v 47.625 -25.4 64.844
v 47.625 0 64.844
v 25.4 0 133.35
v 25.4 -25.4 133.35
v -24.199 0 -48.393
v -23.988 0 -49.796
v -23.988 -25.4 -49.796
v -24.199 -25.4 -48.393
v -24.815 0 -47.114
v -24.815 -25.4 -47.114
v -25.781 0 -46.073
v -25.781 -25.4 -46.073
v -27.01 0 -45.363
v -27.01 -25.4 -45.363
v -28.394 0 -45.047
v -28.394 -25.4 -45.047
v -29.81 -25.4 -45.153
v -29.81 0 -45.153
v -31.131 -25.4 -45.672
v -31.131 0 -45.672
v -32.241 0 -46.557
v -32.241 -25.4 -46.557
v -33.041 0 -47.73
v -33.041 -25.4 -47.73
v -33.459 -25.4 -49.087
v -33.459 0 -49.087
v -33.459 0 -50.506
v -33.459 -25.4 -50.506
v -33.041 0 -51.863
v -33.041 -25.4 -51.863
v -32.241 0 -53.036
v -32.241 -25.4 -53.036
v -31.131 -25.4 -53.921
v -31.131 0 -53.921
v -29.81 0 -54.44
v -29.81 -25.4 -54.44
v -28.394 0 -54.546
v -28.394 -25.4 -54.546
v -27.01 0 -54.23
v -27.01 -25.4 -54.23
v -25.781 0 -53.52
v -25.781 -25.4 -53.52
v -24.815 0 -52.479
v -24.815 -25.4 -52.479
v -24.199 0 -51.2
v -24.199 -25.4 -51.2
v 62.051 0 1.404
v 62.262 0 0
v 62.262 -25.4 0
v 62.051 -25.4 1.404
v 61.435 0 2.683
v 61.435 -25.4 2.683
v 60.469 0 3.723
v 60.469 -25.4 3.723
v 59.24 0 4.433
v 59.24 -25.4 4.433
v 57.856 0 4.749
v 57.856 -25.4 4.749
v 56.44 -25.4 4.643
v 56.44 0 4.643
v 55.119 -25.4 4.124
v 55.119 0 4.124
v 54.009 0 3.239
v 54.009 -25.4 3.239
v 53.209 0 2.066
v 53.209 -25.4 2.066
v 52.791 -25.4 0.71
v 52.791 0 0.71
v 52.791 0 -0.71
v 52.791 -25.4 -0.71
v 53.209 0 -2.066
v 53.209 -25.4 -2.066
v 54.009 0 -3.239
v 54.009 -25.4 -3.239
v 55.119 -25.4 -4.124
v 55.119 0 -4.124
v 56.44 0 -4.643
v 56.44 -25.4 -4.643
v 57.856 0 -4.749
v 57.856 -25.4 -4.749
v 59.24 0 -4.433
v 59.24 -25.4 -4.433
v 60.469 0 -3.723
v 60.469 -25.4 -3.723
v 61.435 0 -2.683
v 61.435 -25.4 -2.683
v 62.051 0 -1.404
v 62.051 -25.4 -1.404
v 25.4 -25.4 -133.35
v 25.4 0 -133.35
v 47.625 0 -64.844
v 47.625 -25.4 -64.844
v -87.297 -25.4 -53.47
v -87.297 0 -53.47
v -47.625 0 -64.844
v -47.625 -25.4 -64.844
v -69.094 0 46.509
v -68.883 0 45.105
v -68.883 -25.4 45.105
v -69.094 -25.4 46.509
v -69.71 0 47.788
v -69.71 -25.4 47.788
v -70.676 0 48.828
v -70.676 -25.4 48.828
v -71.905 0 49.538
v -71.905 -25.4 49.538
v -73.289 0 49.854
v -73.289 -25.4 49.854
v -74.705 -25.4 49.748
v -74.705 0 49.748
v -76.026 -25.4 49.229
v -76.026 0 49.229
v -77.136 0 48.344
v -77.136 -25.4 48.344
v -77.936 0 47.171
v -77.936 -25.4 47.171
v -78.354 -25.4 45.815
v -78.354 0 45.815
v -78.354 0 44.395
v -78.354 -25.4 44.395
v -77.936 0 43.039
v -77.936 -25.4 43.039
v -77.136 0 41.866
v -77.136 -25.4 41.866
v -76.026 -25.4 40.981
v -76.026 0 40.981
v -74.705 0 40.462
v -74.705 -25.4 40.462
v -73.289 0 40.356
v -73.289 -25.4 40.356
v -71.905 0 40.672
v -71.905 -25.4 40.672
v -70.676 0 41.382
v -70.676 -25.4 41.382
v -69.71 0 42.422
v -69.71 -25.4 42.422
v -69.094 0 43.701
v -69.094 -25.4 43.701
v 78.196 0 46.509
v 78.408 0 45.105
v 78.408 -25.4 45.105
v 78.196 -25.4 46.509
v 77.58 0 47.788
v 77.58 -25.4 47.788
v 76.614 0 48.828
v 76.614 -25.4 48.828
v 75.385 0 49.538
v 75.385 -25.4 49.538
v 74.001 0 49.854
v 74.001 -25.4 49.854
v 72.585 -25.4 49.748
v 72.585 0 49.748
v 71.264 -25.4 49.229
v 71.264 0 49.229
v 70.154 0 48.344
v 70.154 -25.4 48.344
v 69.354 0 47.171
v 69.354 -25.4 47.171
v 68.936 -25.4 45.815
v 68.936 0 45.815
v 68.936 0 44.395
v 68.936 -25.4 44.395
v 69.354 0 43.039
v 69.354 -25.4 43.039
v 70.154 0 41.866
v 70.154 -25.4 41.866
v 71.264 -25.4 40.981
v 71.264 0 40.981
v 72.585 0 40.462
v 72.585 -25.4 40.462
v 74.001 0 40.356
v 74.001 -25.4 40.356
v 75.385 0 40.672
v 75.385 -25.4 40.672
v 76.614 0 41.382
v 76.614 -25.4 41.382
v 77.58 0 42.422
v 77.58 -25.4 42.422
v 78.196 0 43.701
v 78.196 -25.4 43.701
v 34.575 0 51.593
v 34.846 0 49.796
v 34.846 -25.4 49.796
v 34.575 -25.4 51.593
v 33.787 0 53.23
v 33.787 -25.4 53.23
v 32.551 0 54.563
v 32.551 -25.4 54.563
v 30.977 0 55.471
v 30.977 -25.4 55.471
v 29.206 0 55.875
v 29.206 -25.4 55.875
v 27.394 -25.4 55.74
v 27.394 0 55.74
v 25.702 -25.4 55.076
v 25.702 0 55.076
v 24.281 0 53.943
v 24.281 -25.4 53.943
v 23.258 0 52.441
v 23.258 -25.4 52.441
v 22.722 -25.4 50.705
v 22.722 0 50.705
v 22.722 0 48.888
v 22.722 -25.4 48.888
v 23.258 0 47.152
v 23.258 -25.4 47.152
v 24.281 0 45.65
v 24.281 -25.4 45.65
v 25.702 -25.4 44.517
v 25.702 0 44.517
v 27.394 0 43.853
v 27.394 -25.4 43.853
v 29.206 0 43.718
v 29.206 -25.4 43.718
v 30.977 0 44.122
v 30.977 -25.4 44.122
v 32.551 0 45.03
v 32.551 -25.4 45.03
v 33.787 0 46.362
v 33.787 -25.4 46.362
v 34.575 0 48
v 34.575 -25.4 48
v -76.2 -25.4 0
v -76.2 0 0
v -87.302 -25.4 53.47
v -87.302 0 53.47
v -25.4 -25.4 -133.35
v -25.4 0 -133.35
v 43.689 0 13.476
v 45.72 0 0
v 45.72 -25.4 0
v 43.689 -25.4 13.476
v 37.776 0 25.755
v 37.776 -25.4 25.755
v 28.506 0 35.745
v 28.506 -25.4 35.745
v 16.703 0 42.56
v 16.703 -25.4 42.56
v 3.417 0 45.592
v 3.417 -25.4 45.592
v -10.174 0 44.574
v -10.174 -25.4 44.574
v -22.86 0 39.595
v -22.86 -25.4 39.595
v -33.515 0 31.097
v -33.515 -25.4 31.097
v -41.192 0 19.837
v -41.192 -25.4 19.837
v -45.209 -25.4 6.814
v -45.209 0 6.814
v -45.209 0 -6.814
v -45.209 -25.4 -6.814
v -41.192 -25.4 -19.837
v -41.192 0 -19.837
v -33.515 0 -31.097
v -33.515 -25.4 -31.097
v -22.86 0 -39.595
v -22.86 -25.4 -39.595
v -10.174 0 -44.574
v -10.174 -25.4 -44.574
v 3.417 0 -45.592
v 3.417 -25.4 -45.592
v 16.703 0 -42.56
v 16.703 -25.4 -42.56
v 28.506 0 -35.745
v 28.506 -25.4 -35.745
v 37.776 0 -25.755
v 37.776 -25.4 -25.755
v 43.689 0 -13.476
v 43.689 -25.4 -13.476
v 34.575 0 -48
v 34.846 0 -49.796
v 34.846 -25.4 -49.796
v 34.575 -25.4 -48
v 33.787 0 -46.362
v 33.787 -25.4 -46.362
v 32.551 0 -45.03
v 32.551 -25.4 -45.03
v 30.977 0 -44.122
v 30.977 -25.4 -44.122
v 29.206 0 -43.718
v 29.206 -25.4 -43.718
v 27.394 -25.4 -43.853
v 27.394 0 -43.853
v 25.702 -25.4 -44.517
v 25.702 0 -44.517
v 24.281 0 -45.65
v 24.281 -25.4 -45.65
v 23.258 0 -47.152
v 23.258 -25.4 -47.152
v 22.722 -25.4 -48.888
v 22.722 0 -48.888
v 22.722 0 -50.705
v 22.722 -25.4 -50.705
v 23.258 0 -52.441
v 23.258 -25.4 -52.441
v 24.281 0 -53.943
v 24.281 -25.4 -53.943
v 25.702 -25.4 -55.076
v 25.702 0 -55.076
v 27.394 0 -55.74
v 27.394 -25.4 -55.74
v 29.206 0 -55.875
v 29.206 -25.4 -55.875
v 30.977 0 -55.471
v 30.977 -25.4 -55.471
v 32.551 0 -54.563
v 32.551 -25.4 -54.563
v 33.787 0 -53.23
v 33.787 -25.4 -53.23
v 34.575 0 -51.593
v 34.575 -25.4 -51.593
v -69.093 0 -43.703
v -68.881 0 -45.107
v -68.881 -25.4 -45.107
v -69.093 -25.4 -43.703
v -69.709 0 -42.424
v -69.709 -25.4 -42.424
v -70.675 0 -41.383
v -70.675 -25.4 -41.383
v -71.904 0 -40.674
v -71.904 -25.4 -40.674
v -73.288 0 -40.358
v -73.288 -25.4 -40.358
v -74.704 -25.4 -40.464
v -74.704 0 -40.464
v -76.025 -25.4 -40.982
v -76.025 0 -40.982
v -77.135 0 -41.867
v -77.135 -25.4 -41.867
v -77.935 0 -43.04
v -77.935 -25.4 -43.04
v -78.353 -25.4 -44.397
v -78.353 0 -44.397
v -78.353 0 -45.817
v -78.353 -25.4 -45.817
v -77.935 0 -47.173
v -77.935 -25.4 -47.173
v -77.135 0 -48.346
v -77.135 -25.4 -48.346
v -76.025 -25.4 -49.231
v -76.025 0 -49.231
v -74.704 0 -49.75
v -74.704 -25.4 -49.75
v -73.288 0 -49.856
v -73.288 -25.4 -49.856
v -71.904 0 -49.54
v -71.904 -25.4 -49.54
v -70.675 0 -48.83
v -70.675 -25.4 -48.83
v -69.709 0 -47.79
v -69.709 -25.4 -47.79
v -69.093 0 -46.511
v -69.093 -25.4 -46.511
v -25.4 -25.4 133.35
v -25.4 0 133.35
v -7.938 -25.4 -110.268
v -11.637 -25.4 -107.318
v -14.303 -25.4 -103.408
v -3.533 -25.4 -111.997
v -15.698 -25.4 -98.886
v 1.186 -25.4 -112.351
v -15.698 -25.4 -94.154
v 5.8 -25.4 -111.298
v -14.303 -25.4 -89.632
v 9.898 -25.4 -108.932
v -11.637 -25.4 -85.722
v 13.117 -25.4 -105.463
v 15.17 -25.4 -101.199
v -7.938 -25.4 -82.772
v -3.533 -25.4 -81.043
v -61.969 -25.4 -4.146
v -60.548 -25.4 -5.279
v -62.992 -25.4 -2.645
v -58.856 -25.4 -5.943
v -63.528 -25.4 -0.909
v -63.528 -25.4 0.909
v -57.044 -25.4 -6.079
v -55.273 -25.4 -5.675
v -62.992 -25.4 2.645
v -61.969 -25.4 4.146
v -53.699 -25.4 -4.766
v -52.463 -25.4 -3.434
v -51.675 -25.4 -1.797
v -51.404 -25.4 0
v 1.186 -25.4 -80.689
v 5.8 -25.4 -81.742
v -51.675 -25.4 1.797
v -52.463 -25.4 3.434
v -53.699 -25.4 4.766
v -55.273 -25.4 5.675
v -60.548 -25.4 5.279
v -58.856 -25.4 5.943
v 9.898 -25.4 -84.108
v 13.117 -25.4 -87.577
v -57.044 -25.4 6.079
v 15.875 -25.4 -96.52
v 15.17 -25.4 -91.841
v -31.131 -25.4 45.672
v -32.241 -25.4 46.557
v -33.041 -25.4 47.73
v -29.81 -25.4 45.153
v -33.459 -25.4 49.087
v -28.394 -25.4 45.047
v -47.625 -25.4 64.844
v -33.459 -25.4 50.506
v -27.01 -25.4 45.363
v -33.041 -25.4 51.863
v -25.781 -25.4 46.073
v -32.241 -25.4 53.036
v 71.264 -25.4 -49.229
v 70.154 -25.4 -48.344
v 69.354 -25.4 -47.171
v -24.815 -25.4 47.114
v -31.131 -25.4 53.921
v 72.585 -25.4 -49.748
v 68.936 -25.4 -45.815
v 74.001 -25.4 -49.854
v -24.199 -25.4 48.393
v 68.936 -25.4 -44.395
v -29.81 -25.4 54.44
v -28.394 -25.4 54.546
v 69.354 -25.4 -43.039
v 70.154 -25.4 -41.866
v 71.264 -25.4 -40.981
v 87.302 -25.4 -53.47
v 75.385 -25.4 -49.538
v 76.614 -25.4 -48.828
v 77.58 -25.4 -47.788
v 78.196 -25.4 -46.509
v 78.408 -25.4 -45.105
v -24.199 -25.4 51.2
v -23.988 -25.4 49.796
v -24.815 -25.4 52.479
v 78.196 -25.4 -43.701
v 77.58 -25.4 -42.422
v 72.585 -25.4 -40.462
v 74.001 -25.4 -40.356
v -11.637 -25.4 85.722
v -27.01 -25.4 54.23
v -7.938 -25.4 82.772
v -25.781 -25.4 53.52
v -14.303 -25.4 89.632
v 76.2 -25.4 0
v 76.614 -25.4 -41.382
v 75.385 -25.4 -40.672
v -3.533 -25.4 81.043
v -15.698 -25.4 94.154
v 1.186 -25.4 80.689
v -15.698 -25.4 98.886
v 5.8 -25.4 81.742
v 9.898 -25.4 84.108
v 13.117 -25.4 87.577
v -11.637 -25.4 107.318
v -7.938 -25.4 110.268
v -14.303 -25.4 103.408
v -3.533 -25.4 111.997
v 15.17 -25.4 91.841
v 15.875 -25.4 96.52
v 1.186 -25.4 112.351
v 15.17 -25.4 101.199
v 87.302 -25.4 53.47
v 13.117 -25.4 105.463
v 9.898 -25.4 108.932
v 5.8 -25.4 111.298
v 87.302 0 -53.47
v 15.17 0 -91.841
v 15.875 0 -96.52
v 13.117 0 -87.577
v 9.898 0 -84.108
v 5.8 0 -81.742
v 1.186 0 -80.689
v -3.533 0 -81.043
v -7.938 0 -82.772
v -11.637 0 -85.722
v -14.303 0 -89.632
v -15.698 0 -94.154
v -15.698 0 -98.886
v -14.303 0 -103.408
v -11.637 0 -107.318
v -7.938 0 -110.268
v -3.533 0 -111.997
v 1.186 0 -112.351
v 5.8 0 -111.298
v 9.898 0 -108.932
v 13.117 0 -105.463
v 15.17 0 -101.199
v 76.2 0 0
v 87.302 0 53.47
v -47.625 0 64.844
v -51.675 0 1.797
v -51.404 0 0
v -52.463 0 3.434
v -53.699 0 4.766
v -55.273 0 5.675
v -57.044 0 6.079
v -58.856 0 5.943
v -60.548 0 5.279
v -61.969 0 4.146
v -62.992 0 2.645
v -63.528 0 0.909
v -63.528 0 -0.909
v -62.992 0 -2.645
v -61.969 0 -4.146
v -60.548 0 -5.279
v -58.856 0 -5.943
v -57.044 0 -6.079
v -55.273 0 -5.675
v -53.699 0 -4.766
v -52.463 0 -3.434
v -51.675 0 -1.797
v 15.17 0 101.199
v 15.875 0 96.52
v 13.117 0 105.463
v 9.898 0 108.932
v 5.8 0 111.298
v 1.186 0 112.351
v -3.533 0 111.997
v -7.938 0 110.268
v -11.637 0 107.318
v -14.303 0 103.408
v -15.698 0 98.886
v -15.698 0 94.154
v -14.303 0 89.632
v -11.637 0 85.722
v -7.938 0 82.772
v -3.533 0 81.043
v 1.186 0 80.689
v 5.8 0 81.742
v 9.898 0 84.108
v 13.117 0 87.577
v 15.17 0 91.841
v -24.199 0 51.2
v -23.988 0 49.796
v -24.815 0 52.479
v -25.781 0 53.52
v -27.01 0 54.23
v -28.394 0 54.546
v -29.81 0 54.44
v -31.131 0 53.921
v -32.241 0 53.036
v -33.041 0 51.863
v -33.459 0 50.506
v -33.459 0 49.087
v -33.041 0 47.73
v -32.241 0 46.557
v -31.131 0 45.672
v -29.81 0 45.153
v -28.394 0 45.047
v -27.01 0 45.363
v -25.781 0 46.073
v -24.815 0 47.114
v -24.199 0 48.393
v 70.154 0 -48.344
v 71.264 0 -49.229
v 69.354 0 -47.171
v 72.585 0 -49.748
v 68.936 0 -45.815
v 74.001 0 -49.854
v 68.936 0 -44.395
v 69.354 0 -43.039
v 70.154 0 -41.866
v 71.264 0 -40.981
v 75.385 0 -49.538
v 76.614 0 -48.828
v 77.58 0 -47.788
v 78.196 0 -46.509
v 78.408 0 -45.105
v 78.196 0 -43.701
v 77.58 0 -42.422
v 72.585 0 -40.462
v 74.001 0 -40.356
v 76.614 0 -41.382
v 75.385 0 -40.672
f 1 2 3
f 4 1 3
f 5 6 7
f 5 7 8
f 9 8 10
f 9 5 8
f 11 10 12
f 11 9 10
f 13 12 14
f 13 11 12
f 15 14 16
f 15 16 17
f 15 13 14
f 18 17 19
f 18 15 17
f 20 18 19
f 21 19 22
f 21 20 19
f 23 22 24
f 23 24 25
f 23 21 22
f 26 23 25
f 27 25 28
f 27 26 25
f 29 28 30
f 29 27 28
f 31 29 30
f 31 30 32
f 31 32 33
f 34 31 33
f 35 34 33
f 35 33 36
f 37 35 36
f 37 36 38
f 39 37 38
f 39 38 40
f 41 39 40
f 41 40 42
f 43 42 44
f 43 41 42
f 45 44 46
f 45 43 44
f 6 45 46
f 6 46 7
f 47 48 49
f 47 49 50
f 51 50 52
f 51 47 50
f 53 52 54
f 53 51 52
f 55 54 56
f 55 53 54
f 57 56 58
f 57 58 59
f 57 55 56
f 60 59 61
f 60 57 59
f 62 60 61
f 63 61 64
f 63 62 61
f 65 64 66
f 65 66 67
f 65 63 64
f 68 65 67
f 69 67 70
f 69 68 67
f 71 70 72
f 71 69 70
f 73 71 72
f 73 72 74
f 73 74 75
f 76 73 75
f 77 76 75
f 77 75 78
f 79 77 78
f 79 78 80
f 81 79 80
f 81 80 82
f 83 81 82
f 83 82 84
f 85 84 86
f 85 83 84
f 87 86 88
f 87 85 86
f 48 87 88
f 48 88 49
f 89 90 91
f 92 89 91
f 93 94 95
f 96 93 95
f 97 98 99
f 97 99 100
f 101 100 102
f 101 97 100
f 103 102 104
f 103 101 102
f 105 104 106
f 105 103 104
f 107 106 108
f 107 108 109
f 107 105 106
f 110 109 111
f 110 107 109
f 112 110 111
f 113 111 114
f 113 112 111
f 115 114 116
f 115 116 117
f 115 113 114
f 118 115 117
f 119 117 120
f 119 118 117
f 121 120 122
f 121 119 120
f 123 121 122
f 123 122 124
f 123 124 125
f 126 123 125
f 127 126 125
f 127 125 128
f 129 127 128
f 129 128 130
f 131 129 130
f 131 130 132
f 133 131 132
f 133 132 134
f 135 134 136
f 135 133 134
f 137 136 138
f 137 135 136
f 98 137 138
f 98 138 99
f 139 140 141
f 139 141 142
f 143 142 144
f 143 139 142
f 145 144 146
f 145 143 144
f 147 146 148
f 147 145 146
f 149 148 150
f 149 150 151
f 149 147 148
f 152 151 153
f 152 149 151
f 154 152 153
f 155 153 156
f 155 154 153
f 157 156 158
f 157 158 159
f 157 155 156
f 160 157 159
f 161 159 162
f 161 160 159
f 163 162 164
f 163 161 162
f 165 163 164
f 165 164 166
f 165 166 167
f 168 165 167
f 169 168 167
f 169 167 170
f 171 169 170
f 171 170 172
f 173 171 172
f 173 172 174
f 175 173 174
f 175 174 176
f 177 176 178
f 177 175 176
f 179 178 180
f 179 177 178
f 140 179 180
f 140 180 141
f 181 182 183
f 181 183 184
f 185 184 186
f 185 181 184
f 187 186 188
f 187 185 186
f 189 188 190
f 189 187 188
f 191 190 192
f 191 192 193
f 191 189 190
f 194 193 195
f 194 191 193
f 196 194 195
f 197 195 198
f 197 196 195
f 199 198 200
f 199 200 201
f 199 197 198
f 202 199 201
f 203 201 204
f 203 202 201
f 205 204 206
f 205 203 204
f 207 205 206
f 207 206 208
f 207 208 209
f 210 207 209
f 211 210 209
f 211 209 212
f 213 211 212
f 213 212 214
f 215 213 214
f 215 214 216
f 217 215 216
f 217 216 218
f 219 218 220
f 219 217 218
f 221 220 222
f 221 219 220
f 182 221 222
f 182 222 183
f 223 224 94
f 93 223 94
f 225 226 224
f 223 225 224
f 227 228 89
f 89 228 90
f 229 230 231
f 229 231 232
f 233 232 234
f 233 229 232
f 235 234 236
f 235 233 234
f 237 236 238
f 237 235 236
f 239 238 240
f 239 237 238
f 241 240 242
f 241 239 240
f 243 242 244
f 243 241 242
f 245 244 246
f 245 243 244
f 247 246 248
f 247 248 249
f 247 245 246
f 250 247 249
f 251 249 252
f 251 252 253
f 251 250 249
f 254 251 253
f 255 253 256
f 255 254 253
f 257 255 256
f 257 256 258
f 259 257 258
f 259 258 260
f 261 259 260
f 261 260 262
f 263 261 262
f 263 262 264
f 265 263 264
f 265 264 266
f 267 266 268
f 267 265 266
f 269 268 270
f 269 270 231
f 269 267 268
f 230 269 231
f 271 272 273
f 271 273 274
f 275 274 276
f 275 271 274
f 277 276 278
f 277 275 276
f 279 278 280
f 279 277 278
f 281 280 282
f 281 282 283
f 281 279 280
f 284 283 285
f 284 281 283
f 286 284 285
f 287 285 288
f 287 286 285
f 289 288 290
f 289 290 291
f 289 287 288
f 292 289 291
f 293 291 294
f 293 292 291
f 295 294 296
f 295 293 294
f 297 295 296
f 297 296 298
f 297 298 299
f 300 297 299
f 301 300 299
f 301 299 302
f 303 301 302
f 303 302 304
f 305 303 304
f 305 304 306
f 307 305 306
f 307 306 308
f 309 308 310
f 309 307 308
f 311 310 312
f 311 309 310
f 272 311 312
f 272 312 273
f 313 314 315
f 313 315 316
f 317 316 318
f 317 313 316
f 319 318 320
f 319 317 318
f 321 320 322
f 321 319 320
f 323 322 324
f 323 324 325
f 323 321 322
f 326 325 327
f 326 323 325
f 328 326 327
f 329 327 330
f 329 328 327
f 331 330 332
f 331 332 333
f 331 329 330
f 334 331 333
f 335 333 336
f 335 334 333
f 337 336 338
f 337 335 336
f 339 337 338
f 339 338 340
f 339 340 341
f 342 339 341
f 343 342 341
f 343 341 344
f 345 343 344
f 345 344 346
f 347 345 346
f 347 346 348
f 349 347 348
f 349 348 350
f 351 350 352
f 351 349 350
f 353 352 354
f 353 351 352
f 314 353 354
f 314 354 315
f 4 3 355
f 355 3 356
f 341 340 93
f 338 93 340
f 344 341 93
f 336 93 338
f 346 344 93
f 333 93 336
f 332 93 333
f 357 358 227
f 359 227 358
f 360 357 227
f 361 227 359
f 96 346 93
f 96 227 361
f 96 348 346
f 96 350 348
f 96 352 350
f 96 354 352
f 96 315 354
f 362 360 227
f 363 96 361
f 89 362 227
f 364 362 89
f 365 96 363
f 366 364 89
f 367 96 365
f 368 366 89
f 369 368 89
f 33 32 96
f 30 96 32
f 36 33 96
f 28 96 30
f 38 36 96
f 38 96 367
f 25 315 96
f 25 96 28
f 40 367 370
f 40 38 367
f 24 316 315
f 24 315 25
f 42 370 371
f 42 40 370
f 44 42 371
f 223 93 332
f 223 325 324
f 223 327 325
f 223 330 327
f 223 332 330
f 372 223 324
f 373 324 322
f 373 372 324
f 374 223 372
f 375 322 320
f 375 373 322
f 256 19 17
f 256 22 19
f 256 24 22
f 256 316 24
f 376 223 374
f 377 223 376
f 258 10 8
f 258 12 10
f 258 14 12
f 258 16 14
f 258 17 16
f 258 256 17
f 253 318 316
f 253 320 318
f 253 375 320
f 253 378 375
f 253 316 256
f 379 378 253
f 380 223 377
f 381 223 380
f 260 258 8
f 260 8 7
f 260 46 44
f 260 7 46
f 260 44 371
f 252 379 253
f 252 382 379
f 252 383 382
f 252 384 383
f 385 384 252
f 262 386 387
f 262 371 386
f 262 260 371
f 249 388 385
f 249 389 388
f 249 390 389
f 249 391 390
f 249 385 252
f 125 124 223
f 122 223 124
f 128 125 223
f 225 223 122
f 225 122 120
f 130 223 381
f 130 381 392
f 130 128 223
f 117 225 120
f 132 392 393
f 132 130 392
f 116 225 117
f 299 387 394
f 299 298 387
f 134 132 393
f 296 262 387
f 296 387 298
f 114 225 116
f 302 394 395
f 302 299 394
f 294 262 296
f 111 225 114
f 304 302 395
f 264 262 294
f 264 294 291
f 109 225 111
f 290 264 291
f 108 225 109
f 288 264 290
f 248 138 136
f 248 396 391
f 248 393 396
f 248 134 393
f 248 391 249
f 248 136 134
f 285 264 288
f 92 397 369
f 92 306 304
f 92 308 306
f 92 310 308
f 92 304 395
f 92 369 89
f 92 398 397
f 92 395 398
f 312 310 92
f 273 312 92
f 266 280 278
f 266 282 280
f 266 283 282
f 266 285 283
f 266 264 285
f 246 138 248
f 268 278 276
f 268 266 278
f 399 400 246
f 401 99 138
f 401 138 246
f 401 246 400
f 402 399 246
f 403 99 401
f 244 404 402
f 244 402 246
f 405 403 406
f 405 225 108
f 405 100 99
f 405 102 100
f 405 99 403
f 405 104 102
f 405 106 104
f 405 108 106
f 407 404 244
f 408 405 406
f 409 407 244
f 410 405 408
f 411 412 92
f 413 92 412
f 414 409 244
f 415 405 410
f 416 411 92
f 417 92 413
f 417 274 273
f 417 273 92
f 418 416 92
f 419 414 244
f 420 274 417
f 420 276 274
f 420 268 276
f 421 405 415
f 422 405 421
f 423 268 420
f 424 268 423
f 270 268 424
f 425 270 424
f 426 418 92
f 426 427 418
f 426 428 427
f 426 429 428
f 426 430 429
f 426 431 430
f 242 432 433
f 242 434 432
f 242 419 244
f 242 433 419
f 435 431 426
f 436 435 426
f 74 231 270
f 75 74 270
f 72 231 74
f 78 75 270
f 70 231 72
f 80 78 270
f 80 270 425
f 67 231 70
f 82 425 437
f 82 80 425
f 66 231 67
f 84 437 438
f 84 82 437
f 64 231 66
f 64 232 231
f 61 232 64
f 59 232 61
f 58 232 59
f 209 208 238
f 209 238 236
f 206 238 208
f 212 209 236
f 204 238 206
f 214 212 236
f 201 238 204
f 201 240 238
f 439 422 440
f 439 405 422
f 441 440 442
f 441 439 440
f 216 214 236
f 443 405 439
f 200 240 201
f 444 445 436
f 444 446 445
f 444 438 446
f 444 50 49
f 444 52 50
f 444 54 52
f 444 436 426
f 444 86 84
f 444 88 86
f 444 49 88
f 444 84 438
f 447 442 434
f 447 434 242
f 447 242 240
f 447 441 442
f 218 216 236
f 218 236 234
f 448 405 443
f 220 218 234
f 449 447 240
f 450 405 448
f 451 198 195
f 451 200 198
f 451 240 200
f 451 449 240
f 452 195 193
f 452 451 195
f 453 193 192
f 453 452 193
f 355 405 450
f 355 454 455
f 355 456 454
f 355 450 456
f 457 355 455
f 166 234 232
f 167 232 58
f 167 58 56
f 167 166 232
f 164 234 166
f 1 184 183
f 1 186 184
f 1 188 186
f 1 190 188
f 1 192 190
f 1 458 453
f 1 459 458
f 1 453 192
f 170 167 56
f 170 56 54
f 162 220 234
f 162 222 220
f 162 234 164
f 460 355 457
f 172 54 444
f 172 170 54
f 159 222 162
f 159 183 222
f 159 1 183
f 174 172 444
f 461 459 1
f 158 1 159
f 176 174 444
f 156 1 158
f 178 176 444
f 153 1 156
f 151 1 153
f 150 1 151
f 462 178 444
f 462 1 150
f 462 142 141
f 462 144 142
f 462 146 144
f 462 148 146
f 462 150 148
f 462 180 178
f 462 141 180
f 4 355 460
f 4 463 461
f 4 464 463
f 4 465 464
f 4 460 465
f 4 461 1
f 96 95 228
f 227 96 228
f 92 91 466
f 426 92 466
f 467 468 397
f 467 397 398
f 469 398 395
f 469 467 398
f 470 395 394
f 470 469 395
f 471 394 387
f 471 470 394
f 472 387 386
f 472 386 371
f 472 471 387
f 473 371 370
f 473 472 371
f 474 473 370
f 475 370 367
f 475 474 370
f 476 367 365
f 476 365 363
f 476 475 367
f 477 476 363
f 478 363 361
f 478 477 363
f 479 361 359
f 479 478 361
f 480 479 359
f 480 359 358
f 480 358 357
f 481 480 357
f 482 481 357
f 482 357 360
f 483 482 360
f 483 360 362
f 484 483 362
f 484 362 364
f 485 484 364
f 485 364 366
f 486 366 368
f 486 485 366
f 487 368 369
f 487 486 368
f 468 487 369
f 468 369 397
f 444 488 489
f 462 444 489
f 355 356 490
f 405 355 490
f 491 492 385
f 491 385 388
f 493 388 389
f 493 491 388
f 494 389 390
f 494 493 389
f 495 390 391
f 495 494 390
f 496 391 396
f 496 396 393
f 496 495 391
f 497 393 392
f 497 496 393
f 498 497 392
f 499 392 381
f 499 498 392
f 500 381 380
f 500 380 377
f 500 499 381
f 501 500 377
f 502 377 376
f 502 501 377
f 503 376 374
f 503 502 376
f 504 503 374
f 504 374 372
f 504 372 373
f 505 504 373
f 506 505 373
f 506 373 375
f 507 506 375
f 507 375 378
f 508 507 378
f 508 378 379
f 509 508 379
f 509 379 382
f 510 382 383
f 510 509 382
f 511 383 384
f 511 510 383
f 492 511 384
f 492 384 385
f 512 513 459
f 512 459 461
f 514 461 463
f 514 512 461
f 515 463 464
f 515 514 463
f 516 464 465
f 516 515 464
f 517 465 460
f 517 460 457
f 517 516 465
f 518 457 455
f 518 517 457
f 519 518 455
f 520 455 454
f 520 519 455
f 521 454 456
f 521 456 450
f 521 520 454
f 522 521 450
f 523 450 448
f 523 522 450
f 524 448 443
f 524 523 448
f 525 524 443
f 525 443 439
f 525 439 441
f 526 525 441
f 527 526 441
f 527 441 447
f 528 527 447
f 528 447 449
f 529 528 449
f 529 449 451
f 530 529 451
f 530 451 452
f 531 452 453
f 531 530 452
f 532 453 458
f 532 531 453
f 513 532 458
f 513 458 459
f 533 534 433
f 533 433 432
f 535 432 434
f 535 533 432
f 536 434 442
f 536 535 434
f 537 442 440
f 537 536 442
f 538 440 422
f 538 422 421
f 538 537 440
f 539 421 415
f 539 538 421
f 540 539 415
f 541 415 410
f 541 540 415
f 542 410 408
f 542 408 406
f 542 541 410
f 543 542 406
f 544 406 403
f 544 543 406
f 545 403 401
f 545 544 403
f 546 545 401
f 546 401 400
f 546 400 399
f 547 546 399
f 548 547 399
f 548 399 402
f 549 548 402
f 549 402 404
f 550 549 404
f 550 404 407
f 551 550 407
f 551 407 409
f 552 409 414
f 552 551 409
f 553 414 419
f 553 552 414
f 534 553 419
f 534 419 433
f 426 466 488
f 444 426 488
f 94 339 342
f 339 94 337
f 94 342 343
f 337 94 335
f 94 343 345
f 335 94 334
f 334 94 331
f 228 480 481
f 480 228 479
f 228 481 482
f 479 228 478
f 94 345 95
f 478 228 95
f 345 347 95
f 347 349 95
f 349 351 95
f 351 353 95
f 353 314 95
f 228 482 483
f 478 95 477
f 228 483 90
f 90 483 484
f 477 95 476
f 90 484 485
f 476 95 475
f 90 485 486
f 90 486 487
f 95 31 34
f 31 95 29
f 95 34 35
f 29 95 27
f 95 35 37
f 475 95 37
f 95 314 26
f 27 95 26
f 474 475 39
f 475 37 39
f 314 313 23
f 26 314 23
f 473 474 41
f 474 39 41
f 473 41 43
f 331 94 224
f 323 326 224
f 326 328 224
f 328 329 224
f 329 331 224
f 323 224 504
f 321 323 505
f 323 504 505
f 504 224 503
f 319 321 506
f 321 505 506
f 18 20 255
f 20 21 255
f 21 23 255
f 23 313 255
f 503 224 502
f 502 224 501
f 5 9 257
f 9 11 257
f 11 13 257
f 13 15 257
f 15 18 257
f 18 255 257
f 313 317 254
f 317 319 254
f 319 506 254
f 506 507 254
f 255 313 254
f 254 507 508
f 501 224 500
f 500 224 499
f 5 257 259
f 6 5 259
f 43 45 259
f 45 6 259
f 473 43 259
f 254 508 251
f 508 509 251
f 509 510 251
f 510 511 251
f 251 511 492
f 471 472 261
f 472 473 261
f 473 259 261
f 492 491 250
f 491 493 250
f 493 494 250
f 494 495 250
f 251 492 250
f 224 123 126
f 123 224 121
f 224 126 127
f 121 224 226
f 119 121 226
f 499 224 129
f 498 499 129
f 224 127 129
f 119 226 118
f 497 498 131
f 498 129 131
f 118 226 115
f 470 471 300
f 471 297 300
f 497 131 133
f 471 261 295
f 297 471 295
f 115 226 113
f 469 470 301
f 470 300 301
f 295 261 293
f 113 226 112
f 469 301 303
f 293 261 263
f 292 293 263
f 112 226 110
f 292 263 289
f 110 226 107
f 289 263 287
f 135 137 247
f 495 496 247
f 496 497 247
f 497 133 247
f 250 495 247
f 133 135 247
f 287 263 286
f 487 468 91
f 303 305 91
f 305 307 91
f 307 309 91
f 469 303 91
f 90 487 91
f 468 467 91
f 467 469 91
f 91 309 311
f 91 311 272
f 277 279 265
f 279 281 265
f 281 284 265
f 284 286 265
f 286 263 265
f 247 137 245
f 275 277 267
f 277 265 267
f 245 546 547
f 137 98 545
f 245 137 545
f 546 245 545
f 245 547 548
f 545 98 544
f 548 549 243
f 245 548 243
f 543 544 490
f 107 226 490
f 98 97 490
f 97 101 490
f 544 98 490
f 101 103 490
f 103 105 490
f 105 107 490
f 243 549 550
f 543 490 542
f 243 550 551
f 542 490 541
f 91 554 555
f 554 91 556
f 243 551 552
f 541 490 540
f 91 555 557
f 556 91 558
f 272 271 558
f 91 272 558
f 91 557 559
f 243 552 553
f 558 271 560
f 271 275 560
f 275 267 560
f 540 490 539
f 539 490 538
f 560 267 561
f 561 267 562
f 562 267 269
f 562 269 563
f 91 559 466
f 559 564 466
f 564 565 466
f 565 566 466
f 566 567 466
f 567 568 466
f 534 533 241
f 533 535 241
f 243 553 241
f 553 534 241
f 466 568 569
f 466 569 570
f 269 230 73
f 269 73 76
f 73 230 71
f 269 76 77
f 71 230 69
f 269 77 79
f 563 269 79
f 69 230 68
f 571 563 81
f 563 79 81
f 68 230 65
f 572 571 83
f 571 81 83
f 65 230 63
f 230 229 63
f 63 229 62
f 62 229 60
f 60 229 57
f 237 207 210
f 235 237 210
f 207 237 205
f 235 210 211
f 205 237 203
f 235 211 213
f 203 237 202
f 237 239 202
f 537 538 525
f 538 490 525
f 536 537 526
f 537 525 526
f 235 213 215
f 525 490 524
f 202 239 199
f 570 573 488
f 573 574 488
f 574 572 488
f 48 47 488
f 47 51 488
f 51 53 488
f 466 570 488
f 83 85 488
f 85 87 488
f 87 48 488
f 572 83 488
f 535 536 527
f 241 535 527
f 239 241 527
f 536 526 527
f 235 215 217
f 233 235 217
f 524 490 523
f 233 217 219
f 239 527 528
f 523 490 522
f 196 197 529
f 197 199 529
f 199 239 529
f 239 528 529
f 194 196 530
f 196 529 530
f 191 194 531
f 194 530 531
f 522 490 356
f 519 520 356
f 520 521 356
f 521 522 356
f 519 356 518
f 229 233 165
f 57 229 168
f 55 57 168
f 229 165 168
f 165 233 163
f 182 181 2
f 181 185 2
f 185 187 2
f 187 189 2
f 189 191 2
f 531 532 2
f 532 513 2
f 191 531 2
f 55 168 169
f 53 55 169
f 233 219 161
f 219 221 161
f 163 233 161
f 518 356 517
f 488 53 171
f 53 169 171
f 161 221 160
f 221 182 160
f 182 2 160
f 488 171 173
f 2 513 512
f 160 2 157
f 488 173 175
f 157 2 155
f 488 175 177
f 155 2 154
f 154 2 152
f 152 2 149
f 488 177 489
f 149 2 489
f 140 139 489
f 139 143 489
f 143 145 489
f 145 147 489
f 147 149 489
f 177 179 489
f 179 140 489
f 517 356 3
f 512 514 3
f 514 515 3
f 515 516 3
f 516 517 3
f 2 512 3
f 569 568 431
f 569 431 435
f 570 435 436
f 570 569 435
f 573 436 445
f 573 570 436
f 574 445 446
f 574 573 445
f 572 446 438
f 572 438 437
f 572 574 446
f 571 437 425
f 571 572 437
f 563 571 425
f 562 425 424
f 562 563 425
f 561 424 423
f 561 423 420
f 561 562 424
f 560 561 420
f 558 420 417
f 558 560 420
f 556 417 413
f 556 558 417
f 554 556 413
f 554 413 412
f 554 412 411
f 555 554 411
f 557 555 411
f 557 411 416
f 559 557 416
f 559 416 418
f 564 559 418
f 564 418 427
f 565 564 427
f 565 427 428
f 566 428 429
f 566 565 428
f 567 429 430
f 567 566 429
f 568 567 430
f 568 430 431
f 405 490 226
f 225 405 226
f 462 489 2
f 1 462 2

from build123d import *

# Parameters (mm, degrees)
F1_R     = 4.7625
F1_R_2   = 15.875
F1_R_3   = 6.096
F1_R_4   = 45.72
F2_DEPTH = 25.4


with BuildPart() as f2:
    # F1 (on face) → F2 (new body)
    with BuildSketch(Plane.XZ):
        Polygon((-47.625, 64.844321), (-87.302212, 53.469552), (-76.2, 0), (-87.297388, -53.469552), (-47.625, -64.844321), (-25.4, -133.35), (25.4, -133.35), (47.625, -64.844321), (87.302212, -53.469552), (76.2, 0), (87.302212, 53.469552), (47.625, 64.844321), (25.4, 133.35), (-25.4, 133.35), align=None)
        with Locations((-73.643908, -45.106811)):
            Circle(F1_R, mode=Mode.SUBTRACT)
        with Locations((-28.75, -49.796461)):
            Circle(F1_R, mode=Mode.SUBTRACT)
        with Locations((0, -96.52)):
            Circle(F1_R_2, mode=Mode.SUBTRACT)
        with Locations((28.75, -49.796461)):
            Circle(F1_R_3, mode=Mode.SUBTRACT)
        with Locations((73.645018, -45.104998)):
            Circle(F1_R, mode=Mode.SUBTRACT)
        with Locations((-57.5, 0)):
            Circle(F1_R_3, mode=Mode.SUBTRACT)
        with Locations((-73.645018, 45.104998)):
            Circle(F1_R, mode=Mode.SUBTRACT)
        with Locations((-28.75, 49.796461)):
            Circle(F1_R, mode=Mode.SUBTRACT)
        Circle(F1_R_4, mode=Mode.SUBTRACT)
        with Locations((28.75, 49.796461)):
            Circle(F1_R_3, mode=Mode.SUBTRACT)
        with Locations((57.5, 0)):
            Circle(F1_R, mode=Mode.SUBTRACT)
        with Locations((73.645018, 45.104998)):
            Circle(F1_R, mode=Mode.SUBTRACT)
        with Locations((0, 96.52)):
            Circle(F1_R_2, mode=Mode.SUBTRACT)
    extrude(amount=F2_DEPTH)


solid = f2.part
